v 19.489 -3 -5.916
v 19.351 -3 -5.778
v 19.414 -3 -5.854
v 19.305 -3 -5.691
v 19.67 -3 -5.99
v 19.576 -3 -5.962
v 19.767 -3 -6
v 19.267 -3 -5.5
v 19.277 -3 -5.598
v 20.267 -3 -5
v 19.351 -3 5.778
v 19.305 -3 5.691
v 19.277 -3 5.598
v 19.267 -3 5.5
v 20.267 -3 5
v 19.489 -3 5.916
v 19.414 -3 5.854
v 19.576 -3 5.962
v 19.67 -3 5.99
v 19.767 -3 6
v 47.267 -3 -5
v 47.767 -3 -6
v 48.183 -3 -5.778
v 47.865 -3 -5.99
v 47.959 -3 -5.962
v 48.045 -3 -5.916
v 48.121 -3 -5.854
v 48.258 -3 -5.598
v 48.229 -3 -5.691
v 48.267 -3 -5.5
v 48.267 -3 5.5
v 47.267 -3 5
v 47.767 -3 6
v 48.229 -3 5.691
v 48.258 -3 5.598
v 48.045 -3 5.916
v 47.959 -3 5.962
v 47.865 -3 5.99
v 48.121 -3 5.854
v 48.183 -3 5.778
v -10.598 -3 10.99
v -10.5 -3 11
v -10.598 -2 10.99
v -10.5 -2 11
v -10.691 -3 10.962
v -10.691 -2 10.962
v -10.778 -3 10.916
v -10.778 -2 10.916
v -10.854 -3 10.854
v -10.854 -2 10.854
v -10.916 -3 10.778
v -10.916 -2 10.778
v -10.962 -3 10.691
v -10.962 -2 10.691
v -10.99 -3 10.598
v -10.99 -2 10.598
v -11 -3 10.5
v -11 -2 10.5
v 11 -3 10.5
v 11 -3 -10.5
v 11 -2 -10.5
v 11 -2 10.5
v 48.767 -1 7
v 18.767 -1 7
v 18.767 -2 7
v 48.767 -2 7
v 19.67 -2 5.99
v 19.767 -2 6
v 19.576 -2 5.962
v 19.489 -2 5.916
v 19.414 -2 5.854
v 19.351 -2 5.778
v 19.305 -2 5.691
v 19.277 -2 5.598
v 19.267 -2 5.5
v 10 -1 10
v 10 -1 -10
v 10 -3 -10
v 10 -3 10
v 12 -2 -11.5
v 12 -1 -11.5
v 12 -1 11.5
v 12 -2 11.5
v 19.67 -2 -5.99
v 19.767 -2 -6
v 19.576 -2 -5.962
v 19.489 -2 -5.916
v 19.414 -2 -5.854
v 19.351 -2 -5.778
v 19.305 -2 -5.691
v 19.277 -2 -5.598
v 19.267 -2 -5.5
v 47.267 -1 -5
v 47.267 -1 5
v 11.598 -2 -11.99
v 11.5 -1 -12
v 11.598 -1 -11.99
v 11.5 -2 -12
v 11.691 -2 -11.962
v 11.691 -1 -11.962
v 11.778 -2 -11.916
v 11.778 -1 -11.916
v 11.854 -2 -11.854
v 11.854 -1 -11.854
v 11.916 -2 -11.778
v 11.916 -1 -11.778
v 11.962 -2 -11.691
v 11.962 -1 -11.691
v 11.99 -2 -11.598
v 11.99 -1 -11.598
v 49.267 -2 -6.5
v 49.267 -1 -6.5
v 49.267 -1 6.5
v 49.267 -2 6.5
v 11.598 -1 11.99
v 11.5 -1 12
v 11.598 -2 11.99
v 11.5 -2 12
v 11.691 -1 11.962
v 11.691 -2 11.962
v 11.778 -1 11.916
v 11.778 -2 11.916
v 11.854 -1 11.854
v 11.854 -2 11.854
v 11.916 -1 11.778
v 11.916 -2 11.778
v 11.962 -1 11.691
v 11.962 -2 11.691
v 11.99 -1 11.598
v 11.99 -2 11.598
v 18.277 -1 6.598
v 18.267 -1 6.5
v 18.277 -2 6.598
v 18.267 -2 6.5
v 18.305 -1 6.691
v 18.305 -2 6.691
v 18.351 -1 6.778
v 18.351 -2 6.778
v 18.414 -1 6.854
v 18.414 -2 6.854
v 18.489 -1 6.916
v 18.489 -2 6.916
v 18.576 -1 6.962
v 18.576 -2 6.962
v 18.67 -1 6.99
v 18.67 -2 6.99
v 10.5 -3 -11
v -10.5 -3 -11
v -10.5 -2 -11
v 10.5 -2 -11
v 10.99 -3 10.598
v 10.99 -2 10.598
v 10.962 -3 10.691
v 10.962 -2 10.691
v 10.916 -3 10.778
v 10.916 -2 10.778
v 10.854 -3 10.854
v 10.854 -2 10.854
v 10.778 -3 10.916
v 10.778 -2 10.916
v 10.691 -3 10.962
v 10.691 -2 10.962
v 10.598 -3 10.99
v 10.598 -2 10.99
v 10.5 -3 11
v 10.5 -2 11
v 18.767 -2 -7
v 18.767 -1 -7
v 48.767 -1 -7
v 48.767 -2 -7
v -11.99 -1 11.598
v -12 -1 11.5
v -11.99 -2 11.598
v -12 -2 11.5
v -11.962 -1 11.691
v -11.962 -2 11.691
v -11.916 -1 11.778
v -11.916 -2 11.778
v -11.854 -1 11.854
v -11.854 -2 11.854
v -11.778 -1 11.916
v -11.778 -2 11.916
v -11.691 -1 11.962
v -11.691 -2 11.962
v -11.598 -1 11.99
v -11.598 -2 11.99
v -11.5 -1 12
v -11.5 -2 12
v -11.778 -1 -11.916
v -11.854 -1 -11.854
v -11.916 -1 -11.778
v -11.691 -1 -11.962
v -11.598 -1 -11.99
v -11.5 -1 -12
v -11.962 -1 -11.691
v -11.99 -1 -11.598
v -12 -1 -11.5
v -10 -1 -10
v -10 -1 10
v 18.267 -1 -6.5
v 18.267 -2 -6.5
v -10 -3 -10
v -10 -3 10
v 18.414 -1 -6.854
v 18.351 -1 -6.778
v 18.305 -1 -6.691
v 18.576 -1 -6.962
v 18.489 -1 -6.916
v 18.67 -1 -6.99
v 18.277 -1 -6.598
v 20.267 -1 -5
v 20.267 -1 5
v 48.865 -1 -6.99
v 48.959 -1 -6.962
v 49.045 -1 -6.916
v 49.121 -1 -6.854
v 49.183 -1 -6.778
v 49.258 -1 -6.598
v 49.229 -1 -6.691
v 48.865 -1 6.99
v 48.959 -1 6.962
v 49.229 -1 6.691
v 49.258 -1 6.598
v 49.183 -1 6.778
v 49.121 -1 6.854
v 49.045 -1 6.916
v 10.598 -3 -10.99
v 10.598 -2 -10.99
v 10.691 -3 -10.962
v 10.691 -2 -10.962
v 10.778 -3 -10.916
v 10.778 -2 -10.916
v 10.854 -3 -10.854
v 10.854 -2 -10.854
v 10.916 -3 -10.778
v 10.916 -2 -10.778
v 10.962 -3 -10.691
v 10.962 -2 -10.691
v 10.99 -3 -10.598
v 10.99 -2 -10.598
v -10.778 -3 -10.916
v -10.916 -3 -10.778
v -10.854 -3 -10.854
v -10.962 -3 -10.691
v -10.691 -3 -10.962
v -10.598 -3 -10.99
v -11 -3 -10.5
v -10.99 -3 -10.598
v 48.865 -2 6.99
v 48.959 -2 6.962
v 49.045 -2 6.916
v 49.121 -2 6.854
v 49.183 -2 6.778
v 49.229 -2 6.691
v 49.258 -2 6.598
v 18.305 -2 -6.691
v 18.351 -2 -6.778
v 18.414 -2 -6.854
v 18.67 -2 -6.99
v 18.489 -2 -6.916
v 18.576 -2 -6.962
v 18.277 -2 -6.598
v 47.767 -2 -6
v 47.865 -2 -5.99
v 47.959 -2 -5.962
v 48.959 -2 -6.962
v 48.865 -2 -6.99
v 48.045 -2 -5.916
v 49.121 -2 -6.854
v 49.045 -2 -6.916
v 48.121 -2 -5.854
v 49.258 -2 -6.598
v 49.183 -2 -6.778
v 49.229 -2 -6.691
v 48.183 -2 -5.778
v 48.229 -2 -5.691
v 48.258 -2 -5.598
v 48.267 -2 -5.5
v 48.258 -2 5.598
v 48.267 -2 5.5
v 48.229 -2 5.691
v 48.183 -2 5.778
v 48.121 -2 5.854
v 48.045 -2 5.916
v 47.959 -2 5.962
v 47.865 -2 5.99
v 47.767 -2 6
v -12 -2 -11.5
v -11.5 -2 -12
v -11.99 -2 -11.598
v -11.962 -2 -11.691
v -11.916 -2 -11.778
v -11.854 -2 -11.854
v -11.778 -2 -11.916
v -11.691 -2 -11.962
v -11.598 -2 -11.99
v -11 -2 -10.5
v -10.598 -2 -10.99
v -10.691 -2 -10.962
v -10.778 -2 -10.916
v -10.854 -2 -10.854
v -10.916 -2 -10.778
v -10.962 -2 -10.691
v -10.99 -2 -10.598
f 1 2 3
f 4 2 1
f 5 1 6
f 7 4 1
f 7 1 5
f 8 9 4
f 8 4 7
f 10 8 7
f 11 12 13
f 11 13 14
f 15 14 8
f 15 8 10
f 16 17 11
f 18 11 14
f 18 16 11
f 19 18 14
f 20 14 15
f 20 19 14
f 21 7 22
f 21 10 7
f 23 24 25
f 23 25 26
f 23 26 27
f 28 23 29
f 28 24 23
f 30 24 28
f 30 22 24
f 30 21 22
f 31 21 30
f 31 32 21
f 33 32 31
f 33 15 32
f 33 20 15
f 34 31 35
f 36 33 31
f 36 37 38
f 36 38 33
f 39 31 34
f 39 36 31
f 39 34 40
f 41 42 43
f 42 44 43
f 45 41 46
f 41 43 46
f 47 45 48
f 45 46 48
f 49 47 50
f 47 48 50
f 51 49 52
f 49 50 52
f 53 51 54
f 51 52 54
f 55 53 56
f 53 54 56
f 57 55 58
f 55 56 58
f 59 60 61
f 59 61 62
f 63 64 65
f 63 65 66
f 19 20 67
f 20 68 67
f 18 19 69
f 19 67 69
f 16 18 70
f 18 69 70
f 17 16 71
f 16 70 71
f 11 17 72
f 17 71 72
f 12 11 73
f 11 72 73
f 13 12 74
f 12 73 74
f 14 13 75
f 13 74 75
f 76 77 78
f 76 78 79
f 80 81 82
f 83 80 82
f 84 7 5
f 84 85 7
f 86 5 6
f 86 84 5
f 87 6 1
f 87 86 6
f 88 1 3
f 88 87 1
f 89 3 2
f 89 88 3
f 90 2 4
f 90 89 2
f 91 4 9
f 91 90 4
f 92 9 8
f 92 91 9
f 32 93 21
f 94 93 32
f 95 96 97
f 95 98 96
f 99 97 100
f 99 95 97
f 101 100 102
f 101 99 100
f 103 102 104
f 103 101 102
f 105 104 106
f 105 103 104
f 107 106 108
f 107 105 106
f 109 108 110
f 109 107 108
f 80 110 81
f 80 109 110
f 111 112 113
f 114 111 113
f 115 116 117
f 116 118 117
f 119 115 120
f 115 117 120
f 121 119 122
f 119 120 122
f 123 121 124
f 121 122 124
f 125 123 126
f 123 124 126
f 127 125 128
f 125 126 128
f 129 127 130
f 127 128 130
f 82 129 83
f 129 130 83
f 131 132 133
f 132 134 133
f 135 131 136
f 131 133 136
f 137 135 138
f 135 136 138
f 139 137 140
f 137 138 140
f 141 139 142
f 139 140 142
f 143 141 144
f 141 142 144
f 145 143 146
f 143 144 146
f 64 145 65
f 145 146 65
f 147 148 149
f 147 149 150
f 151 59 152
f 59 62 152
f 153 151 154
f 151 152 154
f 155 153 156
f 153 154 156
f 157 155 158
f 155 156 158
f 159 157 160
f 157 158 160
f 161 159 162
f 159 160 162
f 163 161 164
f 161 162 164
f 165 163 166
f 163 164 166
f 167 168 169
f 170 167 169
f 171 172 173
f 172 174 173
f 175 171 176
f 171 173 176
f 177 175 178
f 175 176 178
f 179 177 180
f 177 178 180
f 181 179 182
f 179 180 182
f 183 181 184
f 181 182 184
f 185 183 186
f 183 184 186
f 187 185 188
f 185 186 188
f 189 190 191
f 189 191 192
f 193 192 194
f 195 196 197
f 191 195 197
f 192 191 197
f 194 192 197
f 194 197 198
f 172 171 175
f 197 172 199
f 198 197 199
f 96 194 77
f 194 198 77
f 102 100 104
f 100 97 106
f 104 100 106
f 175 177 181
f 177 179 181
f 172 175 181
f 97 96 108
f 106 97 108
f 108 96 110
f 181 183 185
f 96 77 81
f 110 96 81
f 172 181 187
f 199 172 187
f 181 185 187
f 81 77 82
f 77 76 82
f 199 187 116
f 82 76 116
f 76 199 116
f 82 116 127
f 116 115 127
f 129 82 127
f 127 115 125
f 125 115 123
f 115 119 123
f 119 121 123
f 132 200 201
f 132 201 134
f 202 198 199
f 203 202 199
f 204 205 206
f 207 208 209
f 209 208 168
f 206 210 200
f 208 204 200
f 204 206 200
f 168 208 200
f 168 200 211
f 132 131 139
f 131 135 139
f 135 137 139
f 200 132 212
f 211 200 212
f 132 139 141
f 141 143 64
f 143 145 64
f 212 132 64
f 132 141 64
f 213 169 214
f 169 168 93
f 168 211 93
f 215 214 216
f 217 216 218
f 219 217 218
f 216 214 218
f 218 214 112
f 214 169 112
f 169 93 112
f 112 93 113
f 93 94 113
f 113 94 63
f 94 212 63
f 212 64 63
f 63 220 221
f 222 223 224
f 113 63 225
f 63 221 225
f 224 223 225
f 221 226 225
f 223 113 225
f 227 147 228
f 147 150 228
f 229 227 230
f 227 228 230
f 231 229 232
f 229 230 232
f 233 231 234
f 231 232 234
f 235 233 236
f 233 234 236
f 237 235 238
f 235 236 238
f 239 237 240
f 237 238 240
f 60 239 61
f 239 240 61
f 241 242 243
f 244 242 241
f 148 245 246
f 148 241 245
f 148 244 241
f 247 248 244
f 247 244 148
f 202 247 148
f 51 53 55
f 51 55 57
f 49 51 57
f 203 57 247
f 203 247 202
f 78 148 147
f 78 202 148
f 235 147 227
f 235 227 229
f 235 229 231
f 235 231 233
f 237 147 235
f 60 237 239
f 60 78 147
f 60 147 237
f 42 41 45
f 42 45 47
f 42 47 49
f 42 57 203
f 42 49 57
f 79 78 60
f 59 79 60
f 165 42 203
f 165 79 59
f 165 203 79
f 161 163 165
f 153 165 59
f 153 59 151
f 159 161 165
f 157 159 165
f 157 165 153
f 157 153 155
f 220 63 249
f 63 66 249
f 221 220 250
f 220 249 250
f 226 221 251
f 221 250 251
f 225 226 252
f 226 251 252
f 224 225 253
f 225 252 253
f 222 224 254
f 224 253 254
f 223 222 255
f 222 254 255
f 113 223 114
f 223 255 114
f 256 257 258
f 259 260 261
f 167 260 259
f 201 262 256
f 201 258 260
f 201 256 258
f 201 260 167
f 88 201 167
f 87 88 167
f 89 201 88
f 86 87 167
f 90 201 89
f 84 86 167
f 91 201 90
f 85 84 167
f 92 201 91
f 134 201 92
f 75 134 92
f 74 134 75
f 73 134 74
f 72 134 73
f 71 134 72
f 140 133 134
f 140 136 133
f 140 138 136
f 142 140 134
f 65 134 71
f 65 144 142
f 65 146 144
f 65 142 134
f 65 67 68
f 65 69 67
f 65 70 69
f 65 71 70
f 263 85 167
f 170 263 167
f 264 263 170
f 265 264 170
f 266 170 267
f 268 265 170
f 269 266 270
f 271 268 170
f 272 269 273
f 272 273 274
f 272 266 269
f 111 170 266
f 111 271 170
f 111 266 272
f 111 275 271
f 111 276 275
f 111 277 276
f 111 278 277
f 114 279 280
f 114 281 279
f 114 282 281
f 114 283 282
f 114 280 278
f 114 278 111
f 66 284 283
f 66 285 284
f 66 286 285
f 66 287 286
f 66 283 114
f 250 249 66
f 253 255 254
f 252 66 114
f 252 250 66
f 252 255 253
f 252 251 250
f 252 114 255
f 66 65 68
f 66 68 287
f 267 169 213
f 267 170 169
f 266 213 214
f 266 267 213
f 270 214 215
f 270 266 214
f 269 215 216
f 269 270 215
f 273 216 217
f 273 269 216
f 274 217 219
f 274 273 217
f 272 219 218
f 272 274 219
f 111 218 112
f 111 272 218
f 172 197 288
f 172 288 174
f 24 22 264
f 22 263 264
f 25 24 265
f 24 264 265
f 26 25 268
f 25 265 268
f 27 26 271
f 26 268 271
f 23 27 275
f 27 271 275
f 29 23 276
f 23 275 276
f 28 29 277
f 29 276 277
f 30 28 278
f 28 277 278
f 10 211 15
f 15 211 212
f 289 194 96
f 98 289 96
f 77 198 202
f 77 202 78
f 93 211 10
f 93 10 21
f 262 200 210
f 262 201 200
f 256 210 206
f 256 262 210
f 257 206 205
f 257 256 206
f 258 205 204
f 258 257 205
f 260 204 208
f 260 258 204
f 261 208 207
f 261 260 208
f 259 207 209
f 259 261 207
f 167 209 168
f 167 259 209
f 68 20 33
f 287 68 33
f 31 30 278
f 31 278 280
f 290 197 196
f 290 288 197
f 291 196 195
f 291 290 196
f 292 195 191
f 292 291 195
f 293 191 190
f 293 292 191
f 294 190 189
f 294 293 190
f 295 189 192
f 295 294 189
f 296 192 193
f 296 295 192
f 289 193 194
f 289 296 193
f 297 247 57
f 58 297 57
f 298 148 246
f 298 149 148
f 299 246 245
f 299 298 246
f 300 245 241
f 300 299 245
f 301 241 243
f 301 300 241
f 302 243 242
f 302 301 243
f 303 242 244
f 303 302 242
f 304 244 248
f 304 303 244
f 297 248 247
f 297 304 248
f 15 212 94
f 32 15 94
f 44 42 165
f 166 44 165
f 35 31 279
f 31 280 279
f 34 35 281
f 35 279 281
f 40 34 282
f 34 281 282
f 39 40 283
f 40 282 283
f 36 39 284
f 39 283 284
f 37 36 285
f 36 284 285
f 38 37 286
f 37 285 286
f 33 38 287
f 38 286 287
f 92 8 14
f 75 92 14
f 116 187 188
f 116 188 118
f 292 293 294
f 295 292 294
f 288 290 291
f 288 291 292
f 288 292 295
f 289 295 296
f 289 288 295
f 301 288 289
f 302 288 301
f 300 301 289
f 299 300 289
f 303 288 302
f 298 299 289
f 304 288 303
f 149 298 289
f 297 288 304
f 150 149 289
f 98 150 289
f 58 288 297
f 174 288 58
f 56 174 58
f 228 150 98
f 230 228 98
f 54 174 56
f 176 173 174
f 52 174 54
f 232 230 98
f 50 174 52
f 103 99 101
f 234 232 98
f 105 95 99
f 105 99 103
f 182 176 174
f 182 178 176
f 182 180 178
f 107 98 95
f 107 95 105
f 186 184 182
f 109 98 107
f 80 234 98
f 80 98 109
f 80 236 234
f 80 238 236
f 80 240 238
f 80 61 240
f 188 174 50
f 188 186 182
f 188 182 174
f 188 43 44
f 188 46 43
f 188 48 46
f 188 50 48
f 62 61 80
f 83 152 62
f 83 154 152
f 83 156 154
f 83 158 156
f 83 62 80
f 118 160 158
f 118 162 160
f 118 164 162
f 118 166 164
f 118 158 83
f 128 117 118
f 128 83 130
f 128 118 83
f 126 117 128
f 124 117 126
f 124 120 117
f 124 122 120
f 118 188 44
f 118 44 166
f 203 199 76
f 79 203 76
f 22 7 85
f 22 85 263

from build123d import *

# Parameters (mm, degrees)
F1_W     = 24
F1_H     = 24
F1_W_2   = 20
F1_H_2   = 20
F2_DEPTH = 2
F1_W_3   = 31
F1_H_3   = 14
F1_W_4   = 27
F1_H_4   = 10
F3_W     = 24
F3_H     = 24
F3_W_2   = 22
F3_H_2   = 22
F3_W_3   = 31
F3_H_3   = 14
F3_W_4   = 29
F3_H_4   = 12
F4_DEPTH = 1
F5_R     = 0.5
F5_2_R   = 0.5


with BuildPart() as f2:
    # F1 (on offset) → F2 (new body)
    with BuildSketch(Plane.XZ.offset(1)):
        Rectangle(F1_W, F1_H)
        Rectangle(F1_W_2, F1_H_2, mode=Mode.SUBTRACT)
    extrude(amount=F2_DEPTH)


with BuildPart() as f2b:
    # F1 (on offset) → F2, piece 2 (new body)
    with BuildSketch(Plane.XZ.offset(1)):
        with Locations((33.7672270834, 0)):
            Rectangle(F1_W_3, F1_H_3)
        with Locations((33.7672270834, 0)):
            Rectangle(F1_W_4, F1_H_4, mode=Mode.SUBTRACT)
    extrude(amount=F2_DEPTH)


with BuildPart() as f4_tool:
    # F3 (on face) → F4 (new body)
    with BuildSketch(Plane.XZ.offset(3)):
        Rectangle(F3_W, F3_H)
        Rectangle(F3_W_2, F3_H_2, mode=Mode.SUBTRACT)
        with Locations((33.7672270834, 0)):
            Rectangle(F3_W_3, F3_H_3)
        with Locations((33.7672270834, 0)):
            Rectangle(F3_W_4, F3_H_4, mode=Mode.SUBTRACT)
    extrude(amount=-F4_DEPTH)


with BuildPart() as f2_1:
    add(f2.part)

    # F4: cut by f4_tool
    add(f4_tool.part, mode=Mode.SUBTRACT)

    # F5
    f5_edges = [f2_1.edges().sort_by_distance(p)[0] for p in [
        (-12, -1.5, 12),
        (-11, -2.5, 11),
        (-11, -2.5, -11),
        (-12, -1.5, -12),
        (11, -2.5, -11),
        (12, -1.5, -12),
        (12, -1.5, 12),
        (11, -2.5, 11),
    ]]
    fillet(f5_edges, radius=F5_R)


with BuildPart() as f2b_1:
    add(f2b.part)

    # F4: cut by f4_tool
    add(f4_tool.part, mode=Mode.SUBTRACT)

    # F5#2
    f5_2_edges = [f2b_1.edges().sort_by_distance(p)[0] for p in [
        (18.267227, -1.5, -7),
        (19.267227, -2.5, -6),
        (18.267227, -1.5, 7),
        (19.267227, -2.5, 6),
        (48.267227, -2.5, -6),
        (49.267227, -1.5, -7),
        (49.267227, -1.5, 7),
        (48.267227, -2.5, 6),
    ]]
    fillet(f5_2_edges, radius=F5_2_R)


solid = Compound([f2_1.part, f2b_1.part])
